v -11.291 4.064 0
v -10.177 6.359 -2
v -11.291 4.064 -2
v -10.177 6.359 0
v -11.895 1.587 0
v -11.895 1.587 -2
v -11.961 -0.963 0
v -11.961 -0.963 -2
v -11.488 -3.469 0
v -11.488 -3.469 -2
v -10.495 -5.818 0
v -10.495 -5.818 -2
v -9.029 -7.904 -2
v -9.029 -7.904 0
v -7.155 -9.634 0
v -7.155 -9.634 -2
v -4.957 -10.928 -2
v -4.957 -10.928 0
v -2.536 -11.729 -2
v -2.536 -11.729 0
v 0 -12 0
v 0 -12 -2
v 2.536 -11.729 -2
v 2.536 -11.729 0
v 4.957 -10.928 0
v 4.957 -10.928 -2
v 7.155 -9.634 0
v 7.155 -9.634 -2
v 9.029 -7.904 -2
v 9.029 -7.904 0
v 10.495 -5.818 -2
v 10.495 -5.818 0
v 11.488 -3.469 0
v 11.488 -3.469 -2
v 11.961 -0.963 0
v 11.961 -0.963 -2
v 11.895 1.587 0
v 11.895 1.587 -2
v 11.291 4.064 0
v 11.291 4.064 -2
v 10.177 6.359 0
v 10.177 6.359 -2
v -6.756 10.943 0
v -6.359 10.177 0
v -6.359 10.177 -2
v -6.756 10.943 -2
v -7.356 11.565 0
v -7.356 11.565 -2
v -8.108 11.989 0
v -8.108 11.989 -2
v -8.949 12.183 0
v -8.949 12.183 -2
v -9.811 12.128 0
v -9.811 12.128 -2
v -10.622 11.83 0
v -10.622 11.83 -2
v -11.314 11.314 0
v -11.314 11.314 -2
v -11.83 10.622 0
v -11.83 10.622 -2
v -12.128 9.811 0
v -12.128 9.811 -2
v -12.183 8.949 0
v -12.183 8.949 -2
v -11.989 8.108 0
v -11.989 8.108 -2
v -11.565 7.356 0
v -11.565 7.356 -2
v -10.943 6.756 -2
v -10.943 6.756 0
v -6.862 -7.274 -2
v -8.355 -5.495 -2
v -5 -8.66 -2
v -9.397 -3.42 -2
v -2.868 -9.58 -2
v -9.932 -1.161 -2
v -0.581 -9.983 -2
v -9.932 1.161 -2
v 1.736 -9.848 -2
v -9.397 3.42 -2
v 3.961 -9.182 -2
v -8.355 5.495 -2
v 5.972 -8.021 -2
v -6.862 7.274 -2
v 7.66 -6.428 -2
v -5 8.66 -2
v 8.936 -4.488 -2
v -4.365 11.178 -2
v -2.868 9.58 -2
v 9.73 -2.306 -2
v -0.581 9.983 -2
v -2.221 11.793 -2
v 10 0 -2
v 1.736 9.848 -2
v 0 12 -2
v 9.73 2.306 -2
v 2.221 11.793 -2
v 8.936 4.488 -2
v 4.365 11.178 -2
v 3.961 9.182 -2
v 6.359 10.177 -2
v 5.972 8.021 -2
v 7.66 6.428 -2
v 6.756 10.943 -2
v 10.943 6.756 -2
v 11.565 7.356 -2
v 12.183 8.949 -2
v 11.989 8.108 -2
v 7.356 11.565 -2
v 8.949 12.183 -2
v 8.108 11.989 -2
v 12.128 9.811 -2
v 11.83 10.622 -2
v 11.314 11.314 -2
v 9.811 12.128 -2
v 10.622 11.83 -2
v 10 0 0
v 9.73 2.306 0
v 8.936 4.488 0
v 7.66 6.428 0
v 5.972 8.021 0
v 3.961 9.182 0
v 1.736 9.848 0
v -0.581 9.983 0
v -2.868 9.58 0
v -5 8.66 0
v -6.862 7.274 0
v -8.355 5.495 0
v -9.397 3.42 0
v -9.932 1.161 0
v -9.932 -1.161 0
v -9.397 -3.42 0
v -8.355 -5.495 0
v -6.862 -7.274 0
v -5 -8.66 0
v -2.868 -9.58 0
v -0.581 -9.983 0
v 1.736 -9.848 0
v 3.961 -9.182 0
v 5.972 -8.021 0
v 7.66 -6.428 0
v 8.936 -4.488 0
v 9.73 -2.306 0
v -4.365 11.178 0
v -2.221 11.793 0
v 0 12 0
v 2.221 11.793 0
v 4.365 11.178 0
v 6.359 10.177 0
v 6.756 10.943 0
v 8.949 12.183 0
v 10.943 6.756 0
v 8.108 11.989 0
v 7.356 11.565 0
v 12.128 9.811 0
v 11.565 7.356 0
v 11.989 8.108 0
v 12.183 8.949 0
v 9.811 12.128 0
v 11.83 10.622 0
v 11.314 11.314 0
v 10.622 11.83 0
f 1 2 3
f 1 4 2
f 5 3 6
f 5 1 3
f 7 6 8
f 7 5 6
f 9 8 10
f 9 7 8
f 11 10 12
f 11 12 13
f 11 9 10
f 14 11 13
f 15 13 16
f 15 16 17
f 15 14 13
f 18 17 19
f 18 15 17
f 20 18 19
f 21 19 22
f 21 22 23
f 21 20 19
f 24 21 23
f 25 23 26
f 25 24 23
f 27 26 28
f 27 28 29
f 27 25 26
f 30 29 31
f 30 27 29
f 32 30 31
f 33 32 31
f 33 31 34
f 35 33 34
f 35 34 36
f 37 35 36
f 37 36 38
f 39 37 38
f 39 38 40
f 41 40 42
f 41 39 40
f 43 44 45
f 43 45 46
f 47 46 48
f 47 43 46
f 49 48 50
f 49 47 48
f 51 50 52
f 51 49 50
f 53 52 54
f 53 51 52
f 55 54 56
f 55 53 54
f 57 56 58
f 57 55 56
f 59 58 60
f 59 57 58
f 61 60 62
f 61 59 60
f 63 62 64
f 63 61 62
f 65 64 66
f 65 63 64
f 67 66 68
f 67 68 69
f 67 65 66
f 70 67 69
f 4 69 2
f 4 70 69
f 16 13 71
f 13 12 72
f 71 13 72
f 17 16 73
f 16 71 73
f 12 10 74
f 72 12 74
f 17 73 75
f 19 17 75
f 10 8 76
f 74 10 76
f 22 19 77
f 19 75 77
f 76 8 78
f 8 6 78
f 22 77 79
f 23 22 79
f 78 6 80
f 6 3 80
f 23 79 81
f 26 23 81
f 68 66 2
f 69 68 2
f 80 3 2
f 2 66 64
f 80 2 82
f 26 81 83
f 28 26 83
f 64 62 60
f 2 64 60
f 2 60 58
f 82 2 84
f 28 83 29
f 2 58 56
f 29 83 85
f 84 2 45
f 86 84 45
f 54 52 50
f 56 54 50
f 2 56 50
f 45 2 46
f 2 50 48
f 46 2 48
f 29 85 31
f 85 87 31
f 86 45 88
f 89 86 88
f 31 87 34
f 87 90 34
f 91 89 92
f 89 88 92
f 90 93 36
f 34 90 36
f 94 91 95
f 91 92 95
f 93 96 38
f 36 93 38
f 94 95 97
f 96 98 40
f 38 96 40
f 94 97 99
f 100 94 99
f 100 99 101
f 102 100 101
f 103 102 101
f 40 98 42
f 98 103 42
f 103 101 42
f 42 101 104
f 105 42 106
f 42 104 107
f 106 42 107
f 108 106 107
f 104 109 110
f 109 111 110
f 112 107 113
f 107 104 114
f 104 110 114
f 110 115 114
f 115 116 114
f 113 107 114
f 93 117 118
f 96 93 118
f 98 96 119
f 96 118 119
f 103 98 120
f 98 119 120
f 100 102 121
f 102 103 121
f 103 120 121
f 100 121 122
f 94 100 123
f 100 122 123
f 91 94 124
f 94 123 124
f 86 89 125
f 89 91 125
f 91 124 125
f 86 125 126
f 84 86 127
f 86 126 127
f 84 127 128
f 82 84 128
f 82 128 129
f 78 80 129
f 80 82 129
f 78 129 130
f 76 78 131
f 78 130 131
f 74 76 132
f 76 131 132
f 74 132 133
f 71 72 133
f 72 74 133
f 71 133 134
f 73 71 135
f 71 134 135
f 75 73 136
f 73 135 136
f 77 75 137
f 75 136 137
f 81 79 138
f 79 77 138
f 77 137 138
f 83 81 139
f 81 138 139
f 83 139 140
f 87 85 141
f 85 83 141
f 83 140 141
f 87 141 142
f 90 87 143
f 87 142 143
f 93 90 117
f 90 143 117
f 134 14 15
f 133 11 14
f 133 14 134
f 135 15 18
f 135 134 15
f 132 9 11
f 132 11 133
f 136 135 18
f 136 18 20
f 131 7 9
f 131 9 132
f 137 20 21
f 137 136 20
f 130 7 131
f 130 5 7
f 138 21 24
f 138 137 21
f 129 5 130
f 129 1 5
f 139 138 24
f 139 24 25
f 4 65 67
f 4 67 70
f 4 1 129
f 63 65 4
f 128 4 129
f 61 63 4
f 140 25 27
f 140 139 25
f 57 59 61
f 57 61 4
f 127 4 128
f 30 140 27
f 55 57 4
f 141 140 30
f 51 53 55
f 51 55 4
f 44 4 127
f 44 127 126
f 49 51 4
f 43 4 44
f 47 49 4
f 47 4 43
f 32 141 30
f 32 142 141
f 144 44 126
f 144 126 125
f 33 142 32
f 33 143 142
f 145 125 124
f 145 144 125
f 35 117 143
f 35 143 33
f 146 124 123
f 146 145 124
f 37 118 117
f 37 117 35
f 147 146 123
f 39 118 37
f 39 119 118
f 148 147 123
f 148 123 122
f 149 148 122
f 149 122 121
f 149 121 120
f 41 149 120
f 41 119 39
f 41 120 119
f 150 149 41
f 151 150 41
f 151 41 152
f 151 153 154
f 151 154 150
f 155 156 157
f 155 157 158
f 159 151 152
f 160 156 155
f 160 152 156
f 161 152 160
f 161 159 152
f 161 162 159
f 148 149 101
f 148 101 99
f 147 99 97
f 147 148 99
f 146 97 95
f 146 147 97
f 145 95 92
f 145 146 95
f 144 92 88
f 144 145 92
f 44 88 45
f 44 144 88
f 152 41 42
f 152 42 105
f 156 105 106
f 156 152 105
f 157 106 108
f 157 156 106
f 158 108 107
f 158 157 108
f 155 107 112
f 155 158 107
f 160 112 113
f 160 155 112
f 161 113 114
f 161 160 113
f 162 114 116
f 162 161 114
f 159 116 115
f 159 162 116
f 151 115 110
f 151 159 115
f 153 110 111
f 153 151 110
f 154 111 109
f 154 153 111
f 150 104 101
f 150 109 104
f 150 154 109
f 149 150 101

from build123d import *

# Parameters (mm, degrees)
SKETCH_R     = 12
SKETCH_R_2   = 10
PAD_DEPTH    = 2
SKETCH001_R  = 3
PAD001_DEPTH = 2


with BuildPart() as part:
    # Sketch → Pad (new body)
    with BuildSketch(Plane.XY):
        Circle(SKETCH_R)
        Circle(SKETCH_R_2, mode=Mode.SUBTRACT)
    extrude(amount=-PAD_DEPTH)

    # Sketch001 → Pad001 (join)
    with BuildSketch(Plane.XY):
        with Locations((-9.192388, 9.192388)):
            Circle(SKETCH001_R)
        with Locations((9.192388, 9.192388)):
            Circle(SKETCH001_R)
    extrude(amount=-PAD001_DEPTH)


solid = part.part
